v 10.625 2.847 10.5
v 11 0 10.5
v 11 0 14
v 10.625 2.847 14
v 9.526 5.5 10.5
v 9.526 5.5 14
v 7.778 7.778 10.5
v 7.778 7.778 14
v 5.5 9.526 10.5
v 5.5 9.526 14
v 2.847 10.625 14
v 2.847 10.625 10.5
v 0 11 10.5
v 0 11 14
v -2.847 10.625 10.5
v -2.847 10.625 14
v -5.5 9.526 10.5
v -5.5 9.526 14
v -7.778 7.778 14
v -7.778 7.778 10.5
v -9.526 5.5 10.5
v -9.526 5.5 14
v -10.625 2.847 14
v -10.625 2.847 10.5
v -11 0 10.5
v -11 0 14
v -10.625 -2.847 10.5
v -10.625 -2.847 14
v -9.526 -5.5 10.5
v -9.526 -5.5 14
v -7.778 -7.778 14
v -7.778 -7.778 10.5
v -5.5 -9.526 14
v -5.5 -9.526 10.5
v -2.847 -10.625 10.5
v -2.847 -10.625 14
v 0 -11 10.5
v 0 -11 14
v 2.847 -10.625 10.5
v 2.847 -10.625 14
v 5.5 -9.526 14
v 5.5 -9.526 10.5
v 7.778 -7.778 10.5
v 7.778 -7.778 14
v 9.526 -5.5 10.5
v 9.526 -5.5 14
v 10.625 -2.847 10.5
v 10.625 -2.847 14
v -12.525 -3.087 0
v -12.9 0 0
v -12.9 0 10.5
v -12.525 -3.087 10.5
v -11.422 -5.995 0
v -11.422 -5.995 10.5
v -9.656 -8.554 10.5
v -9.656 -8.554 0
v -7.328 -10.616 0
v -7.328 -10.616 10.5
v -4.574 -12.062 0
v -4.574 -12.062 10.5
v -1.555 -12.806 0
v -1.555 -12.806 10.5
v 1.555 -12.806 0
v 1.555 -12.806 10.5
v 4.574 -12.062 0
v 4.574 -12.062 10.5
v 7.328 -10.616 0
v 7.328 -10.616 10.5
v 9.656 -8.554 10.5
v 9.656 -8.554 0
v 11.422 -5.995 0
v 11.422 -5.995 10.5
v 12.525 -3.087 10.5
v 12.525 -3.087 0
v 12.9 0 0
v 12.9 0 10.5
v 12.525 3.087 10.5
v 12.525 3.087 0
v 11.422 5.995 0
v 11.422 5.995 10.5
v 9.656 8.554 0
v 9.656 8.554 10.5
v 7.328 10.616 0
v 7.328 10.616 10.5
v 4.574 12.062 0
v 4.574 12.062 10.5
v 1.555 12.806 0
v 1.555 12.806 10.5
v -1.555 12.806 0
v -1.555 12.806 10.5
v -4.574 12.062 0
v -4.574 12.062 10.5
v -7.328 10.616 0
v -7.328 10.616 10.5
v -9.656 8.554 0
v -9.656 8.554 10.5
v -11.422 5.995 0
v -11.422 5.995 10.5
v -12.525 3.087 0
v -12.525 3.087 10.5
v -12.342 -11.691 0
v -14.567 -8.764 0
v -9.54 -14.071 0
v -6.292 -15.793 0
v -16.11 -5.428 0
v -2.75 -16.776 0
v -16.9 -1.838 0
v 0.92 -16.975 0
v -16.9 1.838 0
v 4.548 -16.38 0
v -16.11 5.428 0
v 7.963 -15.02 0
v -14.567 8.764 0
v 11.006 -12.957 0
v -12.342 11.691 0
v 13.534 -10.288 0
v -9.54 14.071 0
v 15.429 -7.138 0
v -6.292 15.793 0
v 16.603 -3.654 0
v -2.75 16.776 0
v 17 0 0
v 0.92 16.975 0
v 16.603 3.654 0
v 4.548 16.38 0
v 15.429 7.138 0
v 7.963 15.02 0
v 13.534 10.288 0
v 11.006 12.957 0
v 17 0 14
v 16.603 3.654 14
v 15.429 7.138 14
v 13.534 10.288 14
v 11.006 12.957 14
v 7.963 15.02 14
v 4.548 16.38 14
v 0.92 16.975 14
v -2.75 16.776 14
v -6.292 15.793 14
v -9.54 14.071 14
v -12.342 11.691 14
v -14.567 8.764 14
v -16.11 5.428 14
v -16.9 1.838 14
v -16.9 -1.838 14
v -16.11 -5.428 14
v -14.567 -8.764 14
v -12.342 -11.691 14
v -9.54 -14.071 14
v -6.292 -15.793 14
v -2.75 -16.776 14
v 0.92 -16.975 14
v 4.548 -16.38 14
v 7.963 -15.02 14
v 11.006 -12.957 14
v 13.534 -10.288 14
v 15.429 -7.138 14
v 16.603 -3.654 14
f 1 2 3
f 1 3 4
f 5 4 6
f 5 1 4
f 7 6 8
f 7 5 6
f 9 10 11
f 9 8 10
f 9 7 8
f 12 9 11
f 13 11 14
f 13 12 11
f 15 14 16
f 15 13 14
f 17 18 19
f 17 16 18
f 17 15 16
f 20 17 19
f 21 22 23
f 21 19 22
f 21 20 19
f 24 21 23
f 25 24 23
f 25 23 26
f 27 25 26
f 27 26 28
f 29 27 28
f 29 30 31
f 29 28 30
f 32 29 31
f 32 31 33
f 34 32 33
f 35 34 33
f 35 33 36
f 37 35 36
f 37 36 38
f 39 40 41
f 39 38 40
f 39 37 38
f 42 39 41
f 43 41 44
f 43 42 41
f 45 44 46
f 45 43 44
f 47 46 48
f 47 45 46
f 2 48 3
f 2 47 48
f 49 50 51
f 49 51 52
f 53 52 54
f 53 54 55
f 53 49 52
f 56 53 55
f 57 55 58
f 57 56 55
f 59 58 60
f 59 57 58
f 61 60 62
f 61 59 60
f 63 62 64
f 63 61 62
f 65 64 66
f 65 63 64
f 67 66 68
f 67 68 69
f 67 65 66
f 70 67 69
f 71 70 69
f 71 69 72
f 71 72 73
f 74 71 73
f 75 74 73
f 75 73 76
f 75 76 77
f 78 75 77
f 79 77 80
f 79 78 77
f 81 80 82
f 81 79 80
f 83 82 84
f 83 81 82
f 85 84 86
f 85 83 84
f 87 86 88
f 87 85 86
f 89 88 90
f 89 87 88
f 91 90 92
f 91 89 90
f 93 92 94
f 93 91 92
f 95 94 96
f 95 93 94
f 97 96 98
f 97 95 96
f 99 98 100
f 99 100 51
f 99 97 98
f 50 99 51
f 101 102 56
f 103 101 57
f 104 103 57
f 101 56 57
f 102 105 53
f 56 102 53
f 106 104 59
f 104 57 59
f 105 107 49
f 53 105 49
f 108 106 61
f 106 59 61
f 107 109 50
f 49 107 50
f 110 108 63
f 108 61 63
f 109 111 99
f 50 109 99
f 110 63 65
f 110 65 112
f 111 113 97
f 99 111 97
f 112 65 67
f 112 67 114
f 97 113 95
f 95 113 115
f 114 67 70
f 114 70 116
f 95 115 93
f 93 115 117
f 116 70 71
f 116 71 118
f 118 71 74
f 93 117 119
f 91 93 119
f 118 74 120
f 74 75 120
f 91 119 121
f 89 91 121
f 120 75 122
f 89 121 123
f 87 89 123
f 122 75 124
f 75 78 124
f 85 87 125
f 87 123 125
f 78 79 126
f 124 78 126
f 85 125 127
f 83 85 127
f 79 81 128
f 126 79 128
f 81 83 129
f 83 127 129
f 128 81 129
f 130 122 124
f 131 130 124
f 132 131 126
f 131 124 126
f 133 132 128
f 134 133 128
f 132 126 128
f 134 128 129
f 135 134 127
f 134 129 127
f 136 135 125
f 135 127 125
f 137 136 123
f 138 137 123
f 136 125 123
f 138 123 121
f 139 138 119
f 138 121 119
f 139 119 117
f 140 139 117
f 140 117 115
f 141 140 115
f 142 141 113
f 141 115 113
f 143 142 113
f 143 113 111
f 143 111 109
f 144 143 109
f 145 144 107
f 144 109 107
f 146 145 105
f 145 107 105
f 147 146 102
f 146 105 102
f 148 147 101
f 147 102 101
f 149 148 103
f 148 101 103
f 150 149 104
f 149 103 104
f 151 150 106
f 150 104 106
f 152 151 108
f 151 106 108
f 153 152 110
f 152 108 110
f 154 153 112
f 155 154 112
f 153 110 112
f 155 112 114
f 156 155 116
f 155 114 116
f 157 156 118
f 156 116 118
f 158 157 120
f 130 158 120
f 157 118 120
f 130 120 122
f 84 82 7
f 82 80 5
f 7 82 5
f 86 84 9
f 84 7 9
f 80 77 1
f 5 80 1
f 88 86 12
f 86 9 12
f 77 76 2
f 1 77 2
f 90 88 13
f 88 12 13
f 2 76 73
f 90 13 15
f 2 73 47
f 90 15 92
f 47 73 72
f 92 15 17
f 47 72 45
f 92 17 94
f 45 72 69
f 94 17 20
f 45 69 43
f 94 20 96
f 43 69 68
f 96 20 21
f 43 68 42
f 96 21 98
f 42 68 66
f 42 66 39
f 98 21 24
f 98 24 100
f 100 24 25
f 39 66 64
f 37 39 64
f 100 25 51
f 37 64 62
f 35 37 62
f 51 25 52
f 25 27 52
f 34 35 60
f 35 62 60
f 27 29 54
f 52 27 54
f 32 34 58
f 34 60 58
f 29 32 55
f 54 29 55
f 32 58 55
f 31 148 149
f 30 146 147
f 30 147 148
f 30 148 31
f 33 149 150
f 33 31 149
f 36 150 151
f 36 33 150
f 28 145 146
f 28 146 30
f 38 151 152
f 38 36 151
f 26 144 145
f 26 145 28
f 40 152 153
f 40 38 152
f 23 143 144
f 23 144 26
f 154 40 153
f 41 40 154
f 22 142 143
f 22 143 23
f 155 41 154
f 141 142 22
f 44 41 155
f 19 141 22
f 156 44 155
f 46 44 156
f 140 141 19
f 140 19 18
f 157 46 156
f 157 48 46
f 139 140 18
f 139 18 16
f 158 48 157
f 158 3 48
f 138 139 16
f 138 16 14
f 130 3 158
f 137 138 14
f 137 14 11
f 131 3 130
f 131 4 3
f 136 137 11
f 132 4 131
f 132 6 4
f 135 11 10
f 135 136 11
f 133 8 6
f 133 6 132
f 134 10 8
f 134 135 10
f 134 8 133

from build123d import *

# Parameters (mm, degrees)
SKETCH1_R           = 17
BOSS_EXTRUDE1_DEPTH = 14
SKETCH2_R           = 12.9
CUT_EXTRUDE1_DEPTH  = 10.5
SKETCH3_R           = 11
CUT_EXTRUDE3_DEPTH  = 28.820855486


with BuildPart() as part:
    # Sketch1 → Boss-Extrude1 (new body)
    with BuildSketch(Plane.XY):
        Circle(SKETCH1_R)
    extrude(amount=BOSS_EXTRUDE1_DEPTH)

    # Sketch2 → Cut-Extrude1 (cut)
    with BuildSketch(Plane.XY):
        with Locations(Location((0, 0, 0), (0, 0, 180))):
            Circle(SKETCH2_R)
    extrude(amount=CUT_EXTRUDE1_DEPTH, mode=Mode.SUBTRACT)

    # Sketch3 → Cut-Extrude3 (cut, through all)
    with BuildSketch(Plane.XY):
        Circle(SKETCH3_R)
    extrude(amount=CUT_EXTRUDE3_DEPTH, mode=Mode.SUBTRACT)


solid = part.part
